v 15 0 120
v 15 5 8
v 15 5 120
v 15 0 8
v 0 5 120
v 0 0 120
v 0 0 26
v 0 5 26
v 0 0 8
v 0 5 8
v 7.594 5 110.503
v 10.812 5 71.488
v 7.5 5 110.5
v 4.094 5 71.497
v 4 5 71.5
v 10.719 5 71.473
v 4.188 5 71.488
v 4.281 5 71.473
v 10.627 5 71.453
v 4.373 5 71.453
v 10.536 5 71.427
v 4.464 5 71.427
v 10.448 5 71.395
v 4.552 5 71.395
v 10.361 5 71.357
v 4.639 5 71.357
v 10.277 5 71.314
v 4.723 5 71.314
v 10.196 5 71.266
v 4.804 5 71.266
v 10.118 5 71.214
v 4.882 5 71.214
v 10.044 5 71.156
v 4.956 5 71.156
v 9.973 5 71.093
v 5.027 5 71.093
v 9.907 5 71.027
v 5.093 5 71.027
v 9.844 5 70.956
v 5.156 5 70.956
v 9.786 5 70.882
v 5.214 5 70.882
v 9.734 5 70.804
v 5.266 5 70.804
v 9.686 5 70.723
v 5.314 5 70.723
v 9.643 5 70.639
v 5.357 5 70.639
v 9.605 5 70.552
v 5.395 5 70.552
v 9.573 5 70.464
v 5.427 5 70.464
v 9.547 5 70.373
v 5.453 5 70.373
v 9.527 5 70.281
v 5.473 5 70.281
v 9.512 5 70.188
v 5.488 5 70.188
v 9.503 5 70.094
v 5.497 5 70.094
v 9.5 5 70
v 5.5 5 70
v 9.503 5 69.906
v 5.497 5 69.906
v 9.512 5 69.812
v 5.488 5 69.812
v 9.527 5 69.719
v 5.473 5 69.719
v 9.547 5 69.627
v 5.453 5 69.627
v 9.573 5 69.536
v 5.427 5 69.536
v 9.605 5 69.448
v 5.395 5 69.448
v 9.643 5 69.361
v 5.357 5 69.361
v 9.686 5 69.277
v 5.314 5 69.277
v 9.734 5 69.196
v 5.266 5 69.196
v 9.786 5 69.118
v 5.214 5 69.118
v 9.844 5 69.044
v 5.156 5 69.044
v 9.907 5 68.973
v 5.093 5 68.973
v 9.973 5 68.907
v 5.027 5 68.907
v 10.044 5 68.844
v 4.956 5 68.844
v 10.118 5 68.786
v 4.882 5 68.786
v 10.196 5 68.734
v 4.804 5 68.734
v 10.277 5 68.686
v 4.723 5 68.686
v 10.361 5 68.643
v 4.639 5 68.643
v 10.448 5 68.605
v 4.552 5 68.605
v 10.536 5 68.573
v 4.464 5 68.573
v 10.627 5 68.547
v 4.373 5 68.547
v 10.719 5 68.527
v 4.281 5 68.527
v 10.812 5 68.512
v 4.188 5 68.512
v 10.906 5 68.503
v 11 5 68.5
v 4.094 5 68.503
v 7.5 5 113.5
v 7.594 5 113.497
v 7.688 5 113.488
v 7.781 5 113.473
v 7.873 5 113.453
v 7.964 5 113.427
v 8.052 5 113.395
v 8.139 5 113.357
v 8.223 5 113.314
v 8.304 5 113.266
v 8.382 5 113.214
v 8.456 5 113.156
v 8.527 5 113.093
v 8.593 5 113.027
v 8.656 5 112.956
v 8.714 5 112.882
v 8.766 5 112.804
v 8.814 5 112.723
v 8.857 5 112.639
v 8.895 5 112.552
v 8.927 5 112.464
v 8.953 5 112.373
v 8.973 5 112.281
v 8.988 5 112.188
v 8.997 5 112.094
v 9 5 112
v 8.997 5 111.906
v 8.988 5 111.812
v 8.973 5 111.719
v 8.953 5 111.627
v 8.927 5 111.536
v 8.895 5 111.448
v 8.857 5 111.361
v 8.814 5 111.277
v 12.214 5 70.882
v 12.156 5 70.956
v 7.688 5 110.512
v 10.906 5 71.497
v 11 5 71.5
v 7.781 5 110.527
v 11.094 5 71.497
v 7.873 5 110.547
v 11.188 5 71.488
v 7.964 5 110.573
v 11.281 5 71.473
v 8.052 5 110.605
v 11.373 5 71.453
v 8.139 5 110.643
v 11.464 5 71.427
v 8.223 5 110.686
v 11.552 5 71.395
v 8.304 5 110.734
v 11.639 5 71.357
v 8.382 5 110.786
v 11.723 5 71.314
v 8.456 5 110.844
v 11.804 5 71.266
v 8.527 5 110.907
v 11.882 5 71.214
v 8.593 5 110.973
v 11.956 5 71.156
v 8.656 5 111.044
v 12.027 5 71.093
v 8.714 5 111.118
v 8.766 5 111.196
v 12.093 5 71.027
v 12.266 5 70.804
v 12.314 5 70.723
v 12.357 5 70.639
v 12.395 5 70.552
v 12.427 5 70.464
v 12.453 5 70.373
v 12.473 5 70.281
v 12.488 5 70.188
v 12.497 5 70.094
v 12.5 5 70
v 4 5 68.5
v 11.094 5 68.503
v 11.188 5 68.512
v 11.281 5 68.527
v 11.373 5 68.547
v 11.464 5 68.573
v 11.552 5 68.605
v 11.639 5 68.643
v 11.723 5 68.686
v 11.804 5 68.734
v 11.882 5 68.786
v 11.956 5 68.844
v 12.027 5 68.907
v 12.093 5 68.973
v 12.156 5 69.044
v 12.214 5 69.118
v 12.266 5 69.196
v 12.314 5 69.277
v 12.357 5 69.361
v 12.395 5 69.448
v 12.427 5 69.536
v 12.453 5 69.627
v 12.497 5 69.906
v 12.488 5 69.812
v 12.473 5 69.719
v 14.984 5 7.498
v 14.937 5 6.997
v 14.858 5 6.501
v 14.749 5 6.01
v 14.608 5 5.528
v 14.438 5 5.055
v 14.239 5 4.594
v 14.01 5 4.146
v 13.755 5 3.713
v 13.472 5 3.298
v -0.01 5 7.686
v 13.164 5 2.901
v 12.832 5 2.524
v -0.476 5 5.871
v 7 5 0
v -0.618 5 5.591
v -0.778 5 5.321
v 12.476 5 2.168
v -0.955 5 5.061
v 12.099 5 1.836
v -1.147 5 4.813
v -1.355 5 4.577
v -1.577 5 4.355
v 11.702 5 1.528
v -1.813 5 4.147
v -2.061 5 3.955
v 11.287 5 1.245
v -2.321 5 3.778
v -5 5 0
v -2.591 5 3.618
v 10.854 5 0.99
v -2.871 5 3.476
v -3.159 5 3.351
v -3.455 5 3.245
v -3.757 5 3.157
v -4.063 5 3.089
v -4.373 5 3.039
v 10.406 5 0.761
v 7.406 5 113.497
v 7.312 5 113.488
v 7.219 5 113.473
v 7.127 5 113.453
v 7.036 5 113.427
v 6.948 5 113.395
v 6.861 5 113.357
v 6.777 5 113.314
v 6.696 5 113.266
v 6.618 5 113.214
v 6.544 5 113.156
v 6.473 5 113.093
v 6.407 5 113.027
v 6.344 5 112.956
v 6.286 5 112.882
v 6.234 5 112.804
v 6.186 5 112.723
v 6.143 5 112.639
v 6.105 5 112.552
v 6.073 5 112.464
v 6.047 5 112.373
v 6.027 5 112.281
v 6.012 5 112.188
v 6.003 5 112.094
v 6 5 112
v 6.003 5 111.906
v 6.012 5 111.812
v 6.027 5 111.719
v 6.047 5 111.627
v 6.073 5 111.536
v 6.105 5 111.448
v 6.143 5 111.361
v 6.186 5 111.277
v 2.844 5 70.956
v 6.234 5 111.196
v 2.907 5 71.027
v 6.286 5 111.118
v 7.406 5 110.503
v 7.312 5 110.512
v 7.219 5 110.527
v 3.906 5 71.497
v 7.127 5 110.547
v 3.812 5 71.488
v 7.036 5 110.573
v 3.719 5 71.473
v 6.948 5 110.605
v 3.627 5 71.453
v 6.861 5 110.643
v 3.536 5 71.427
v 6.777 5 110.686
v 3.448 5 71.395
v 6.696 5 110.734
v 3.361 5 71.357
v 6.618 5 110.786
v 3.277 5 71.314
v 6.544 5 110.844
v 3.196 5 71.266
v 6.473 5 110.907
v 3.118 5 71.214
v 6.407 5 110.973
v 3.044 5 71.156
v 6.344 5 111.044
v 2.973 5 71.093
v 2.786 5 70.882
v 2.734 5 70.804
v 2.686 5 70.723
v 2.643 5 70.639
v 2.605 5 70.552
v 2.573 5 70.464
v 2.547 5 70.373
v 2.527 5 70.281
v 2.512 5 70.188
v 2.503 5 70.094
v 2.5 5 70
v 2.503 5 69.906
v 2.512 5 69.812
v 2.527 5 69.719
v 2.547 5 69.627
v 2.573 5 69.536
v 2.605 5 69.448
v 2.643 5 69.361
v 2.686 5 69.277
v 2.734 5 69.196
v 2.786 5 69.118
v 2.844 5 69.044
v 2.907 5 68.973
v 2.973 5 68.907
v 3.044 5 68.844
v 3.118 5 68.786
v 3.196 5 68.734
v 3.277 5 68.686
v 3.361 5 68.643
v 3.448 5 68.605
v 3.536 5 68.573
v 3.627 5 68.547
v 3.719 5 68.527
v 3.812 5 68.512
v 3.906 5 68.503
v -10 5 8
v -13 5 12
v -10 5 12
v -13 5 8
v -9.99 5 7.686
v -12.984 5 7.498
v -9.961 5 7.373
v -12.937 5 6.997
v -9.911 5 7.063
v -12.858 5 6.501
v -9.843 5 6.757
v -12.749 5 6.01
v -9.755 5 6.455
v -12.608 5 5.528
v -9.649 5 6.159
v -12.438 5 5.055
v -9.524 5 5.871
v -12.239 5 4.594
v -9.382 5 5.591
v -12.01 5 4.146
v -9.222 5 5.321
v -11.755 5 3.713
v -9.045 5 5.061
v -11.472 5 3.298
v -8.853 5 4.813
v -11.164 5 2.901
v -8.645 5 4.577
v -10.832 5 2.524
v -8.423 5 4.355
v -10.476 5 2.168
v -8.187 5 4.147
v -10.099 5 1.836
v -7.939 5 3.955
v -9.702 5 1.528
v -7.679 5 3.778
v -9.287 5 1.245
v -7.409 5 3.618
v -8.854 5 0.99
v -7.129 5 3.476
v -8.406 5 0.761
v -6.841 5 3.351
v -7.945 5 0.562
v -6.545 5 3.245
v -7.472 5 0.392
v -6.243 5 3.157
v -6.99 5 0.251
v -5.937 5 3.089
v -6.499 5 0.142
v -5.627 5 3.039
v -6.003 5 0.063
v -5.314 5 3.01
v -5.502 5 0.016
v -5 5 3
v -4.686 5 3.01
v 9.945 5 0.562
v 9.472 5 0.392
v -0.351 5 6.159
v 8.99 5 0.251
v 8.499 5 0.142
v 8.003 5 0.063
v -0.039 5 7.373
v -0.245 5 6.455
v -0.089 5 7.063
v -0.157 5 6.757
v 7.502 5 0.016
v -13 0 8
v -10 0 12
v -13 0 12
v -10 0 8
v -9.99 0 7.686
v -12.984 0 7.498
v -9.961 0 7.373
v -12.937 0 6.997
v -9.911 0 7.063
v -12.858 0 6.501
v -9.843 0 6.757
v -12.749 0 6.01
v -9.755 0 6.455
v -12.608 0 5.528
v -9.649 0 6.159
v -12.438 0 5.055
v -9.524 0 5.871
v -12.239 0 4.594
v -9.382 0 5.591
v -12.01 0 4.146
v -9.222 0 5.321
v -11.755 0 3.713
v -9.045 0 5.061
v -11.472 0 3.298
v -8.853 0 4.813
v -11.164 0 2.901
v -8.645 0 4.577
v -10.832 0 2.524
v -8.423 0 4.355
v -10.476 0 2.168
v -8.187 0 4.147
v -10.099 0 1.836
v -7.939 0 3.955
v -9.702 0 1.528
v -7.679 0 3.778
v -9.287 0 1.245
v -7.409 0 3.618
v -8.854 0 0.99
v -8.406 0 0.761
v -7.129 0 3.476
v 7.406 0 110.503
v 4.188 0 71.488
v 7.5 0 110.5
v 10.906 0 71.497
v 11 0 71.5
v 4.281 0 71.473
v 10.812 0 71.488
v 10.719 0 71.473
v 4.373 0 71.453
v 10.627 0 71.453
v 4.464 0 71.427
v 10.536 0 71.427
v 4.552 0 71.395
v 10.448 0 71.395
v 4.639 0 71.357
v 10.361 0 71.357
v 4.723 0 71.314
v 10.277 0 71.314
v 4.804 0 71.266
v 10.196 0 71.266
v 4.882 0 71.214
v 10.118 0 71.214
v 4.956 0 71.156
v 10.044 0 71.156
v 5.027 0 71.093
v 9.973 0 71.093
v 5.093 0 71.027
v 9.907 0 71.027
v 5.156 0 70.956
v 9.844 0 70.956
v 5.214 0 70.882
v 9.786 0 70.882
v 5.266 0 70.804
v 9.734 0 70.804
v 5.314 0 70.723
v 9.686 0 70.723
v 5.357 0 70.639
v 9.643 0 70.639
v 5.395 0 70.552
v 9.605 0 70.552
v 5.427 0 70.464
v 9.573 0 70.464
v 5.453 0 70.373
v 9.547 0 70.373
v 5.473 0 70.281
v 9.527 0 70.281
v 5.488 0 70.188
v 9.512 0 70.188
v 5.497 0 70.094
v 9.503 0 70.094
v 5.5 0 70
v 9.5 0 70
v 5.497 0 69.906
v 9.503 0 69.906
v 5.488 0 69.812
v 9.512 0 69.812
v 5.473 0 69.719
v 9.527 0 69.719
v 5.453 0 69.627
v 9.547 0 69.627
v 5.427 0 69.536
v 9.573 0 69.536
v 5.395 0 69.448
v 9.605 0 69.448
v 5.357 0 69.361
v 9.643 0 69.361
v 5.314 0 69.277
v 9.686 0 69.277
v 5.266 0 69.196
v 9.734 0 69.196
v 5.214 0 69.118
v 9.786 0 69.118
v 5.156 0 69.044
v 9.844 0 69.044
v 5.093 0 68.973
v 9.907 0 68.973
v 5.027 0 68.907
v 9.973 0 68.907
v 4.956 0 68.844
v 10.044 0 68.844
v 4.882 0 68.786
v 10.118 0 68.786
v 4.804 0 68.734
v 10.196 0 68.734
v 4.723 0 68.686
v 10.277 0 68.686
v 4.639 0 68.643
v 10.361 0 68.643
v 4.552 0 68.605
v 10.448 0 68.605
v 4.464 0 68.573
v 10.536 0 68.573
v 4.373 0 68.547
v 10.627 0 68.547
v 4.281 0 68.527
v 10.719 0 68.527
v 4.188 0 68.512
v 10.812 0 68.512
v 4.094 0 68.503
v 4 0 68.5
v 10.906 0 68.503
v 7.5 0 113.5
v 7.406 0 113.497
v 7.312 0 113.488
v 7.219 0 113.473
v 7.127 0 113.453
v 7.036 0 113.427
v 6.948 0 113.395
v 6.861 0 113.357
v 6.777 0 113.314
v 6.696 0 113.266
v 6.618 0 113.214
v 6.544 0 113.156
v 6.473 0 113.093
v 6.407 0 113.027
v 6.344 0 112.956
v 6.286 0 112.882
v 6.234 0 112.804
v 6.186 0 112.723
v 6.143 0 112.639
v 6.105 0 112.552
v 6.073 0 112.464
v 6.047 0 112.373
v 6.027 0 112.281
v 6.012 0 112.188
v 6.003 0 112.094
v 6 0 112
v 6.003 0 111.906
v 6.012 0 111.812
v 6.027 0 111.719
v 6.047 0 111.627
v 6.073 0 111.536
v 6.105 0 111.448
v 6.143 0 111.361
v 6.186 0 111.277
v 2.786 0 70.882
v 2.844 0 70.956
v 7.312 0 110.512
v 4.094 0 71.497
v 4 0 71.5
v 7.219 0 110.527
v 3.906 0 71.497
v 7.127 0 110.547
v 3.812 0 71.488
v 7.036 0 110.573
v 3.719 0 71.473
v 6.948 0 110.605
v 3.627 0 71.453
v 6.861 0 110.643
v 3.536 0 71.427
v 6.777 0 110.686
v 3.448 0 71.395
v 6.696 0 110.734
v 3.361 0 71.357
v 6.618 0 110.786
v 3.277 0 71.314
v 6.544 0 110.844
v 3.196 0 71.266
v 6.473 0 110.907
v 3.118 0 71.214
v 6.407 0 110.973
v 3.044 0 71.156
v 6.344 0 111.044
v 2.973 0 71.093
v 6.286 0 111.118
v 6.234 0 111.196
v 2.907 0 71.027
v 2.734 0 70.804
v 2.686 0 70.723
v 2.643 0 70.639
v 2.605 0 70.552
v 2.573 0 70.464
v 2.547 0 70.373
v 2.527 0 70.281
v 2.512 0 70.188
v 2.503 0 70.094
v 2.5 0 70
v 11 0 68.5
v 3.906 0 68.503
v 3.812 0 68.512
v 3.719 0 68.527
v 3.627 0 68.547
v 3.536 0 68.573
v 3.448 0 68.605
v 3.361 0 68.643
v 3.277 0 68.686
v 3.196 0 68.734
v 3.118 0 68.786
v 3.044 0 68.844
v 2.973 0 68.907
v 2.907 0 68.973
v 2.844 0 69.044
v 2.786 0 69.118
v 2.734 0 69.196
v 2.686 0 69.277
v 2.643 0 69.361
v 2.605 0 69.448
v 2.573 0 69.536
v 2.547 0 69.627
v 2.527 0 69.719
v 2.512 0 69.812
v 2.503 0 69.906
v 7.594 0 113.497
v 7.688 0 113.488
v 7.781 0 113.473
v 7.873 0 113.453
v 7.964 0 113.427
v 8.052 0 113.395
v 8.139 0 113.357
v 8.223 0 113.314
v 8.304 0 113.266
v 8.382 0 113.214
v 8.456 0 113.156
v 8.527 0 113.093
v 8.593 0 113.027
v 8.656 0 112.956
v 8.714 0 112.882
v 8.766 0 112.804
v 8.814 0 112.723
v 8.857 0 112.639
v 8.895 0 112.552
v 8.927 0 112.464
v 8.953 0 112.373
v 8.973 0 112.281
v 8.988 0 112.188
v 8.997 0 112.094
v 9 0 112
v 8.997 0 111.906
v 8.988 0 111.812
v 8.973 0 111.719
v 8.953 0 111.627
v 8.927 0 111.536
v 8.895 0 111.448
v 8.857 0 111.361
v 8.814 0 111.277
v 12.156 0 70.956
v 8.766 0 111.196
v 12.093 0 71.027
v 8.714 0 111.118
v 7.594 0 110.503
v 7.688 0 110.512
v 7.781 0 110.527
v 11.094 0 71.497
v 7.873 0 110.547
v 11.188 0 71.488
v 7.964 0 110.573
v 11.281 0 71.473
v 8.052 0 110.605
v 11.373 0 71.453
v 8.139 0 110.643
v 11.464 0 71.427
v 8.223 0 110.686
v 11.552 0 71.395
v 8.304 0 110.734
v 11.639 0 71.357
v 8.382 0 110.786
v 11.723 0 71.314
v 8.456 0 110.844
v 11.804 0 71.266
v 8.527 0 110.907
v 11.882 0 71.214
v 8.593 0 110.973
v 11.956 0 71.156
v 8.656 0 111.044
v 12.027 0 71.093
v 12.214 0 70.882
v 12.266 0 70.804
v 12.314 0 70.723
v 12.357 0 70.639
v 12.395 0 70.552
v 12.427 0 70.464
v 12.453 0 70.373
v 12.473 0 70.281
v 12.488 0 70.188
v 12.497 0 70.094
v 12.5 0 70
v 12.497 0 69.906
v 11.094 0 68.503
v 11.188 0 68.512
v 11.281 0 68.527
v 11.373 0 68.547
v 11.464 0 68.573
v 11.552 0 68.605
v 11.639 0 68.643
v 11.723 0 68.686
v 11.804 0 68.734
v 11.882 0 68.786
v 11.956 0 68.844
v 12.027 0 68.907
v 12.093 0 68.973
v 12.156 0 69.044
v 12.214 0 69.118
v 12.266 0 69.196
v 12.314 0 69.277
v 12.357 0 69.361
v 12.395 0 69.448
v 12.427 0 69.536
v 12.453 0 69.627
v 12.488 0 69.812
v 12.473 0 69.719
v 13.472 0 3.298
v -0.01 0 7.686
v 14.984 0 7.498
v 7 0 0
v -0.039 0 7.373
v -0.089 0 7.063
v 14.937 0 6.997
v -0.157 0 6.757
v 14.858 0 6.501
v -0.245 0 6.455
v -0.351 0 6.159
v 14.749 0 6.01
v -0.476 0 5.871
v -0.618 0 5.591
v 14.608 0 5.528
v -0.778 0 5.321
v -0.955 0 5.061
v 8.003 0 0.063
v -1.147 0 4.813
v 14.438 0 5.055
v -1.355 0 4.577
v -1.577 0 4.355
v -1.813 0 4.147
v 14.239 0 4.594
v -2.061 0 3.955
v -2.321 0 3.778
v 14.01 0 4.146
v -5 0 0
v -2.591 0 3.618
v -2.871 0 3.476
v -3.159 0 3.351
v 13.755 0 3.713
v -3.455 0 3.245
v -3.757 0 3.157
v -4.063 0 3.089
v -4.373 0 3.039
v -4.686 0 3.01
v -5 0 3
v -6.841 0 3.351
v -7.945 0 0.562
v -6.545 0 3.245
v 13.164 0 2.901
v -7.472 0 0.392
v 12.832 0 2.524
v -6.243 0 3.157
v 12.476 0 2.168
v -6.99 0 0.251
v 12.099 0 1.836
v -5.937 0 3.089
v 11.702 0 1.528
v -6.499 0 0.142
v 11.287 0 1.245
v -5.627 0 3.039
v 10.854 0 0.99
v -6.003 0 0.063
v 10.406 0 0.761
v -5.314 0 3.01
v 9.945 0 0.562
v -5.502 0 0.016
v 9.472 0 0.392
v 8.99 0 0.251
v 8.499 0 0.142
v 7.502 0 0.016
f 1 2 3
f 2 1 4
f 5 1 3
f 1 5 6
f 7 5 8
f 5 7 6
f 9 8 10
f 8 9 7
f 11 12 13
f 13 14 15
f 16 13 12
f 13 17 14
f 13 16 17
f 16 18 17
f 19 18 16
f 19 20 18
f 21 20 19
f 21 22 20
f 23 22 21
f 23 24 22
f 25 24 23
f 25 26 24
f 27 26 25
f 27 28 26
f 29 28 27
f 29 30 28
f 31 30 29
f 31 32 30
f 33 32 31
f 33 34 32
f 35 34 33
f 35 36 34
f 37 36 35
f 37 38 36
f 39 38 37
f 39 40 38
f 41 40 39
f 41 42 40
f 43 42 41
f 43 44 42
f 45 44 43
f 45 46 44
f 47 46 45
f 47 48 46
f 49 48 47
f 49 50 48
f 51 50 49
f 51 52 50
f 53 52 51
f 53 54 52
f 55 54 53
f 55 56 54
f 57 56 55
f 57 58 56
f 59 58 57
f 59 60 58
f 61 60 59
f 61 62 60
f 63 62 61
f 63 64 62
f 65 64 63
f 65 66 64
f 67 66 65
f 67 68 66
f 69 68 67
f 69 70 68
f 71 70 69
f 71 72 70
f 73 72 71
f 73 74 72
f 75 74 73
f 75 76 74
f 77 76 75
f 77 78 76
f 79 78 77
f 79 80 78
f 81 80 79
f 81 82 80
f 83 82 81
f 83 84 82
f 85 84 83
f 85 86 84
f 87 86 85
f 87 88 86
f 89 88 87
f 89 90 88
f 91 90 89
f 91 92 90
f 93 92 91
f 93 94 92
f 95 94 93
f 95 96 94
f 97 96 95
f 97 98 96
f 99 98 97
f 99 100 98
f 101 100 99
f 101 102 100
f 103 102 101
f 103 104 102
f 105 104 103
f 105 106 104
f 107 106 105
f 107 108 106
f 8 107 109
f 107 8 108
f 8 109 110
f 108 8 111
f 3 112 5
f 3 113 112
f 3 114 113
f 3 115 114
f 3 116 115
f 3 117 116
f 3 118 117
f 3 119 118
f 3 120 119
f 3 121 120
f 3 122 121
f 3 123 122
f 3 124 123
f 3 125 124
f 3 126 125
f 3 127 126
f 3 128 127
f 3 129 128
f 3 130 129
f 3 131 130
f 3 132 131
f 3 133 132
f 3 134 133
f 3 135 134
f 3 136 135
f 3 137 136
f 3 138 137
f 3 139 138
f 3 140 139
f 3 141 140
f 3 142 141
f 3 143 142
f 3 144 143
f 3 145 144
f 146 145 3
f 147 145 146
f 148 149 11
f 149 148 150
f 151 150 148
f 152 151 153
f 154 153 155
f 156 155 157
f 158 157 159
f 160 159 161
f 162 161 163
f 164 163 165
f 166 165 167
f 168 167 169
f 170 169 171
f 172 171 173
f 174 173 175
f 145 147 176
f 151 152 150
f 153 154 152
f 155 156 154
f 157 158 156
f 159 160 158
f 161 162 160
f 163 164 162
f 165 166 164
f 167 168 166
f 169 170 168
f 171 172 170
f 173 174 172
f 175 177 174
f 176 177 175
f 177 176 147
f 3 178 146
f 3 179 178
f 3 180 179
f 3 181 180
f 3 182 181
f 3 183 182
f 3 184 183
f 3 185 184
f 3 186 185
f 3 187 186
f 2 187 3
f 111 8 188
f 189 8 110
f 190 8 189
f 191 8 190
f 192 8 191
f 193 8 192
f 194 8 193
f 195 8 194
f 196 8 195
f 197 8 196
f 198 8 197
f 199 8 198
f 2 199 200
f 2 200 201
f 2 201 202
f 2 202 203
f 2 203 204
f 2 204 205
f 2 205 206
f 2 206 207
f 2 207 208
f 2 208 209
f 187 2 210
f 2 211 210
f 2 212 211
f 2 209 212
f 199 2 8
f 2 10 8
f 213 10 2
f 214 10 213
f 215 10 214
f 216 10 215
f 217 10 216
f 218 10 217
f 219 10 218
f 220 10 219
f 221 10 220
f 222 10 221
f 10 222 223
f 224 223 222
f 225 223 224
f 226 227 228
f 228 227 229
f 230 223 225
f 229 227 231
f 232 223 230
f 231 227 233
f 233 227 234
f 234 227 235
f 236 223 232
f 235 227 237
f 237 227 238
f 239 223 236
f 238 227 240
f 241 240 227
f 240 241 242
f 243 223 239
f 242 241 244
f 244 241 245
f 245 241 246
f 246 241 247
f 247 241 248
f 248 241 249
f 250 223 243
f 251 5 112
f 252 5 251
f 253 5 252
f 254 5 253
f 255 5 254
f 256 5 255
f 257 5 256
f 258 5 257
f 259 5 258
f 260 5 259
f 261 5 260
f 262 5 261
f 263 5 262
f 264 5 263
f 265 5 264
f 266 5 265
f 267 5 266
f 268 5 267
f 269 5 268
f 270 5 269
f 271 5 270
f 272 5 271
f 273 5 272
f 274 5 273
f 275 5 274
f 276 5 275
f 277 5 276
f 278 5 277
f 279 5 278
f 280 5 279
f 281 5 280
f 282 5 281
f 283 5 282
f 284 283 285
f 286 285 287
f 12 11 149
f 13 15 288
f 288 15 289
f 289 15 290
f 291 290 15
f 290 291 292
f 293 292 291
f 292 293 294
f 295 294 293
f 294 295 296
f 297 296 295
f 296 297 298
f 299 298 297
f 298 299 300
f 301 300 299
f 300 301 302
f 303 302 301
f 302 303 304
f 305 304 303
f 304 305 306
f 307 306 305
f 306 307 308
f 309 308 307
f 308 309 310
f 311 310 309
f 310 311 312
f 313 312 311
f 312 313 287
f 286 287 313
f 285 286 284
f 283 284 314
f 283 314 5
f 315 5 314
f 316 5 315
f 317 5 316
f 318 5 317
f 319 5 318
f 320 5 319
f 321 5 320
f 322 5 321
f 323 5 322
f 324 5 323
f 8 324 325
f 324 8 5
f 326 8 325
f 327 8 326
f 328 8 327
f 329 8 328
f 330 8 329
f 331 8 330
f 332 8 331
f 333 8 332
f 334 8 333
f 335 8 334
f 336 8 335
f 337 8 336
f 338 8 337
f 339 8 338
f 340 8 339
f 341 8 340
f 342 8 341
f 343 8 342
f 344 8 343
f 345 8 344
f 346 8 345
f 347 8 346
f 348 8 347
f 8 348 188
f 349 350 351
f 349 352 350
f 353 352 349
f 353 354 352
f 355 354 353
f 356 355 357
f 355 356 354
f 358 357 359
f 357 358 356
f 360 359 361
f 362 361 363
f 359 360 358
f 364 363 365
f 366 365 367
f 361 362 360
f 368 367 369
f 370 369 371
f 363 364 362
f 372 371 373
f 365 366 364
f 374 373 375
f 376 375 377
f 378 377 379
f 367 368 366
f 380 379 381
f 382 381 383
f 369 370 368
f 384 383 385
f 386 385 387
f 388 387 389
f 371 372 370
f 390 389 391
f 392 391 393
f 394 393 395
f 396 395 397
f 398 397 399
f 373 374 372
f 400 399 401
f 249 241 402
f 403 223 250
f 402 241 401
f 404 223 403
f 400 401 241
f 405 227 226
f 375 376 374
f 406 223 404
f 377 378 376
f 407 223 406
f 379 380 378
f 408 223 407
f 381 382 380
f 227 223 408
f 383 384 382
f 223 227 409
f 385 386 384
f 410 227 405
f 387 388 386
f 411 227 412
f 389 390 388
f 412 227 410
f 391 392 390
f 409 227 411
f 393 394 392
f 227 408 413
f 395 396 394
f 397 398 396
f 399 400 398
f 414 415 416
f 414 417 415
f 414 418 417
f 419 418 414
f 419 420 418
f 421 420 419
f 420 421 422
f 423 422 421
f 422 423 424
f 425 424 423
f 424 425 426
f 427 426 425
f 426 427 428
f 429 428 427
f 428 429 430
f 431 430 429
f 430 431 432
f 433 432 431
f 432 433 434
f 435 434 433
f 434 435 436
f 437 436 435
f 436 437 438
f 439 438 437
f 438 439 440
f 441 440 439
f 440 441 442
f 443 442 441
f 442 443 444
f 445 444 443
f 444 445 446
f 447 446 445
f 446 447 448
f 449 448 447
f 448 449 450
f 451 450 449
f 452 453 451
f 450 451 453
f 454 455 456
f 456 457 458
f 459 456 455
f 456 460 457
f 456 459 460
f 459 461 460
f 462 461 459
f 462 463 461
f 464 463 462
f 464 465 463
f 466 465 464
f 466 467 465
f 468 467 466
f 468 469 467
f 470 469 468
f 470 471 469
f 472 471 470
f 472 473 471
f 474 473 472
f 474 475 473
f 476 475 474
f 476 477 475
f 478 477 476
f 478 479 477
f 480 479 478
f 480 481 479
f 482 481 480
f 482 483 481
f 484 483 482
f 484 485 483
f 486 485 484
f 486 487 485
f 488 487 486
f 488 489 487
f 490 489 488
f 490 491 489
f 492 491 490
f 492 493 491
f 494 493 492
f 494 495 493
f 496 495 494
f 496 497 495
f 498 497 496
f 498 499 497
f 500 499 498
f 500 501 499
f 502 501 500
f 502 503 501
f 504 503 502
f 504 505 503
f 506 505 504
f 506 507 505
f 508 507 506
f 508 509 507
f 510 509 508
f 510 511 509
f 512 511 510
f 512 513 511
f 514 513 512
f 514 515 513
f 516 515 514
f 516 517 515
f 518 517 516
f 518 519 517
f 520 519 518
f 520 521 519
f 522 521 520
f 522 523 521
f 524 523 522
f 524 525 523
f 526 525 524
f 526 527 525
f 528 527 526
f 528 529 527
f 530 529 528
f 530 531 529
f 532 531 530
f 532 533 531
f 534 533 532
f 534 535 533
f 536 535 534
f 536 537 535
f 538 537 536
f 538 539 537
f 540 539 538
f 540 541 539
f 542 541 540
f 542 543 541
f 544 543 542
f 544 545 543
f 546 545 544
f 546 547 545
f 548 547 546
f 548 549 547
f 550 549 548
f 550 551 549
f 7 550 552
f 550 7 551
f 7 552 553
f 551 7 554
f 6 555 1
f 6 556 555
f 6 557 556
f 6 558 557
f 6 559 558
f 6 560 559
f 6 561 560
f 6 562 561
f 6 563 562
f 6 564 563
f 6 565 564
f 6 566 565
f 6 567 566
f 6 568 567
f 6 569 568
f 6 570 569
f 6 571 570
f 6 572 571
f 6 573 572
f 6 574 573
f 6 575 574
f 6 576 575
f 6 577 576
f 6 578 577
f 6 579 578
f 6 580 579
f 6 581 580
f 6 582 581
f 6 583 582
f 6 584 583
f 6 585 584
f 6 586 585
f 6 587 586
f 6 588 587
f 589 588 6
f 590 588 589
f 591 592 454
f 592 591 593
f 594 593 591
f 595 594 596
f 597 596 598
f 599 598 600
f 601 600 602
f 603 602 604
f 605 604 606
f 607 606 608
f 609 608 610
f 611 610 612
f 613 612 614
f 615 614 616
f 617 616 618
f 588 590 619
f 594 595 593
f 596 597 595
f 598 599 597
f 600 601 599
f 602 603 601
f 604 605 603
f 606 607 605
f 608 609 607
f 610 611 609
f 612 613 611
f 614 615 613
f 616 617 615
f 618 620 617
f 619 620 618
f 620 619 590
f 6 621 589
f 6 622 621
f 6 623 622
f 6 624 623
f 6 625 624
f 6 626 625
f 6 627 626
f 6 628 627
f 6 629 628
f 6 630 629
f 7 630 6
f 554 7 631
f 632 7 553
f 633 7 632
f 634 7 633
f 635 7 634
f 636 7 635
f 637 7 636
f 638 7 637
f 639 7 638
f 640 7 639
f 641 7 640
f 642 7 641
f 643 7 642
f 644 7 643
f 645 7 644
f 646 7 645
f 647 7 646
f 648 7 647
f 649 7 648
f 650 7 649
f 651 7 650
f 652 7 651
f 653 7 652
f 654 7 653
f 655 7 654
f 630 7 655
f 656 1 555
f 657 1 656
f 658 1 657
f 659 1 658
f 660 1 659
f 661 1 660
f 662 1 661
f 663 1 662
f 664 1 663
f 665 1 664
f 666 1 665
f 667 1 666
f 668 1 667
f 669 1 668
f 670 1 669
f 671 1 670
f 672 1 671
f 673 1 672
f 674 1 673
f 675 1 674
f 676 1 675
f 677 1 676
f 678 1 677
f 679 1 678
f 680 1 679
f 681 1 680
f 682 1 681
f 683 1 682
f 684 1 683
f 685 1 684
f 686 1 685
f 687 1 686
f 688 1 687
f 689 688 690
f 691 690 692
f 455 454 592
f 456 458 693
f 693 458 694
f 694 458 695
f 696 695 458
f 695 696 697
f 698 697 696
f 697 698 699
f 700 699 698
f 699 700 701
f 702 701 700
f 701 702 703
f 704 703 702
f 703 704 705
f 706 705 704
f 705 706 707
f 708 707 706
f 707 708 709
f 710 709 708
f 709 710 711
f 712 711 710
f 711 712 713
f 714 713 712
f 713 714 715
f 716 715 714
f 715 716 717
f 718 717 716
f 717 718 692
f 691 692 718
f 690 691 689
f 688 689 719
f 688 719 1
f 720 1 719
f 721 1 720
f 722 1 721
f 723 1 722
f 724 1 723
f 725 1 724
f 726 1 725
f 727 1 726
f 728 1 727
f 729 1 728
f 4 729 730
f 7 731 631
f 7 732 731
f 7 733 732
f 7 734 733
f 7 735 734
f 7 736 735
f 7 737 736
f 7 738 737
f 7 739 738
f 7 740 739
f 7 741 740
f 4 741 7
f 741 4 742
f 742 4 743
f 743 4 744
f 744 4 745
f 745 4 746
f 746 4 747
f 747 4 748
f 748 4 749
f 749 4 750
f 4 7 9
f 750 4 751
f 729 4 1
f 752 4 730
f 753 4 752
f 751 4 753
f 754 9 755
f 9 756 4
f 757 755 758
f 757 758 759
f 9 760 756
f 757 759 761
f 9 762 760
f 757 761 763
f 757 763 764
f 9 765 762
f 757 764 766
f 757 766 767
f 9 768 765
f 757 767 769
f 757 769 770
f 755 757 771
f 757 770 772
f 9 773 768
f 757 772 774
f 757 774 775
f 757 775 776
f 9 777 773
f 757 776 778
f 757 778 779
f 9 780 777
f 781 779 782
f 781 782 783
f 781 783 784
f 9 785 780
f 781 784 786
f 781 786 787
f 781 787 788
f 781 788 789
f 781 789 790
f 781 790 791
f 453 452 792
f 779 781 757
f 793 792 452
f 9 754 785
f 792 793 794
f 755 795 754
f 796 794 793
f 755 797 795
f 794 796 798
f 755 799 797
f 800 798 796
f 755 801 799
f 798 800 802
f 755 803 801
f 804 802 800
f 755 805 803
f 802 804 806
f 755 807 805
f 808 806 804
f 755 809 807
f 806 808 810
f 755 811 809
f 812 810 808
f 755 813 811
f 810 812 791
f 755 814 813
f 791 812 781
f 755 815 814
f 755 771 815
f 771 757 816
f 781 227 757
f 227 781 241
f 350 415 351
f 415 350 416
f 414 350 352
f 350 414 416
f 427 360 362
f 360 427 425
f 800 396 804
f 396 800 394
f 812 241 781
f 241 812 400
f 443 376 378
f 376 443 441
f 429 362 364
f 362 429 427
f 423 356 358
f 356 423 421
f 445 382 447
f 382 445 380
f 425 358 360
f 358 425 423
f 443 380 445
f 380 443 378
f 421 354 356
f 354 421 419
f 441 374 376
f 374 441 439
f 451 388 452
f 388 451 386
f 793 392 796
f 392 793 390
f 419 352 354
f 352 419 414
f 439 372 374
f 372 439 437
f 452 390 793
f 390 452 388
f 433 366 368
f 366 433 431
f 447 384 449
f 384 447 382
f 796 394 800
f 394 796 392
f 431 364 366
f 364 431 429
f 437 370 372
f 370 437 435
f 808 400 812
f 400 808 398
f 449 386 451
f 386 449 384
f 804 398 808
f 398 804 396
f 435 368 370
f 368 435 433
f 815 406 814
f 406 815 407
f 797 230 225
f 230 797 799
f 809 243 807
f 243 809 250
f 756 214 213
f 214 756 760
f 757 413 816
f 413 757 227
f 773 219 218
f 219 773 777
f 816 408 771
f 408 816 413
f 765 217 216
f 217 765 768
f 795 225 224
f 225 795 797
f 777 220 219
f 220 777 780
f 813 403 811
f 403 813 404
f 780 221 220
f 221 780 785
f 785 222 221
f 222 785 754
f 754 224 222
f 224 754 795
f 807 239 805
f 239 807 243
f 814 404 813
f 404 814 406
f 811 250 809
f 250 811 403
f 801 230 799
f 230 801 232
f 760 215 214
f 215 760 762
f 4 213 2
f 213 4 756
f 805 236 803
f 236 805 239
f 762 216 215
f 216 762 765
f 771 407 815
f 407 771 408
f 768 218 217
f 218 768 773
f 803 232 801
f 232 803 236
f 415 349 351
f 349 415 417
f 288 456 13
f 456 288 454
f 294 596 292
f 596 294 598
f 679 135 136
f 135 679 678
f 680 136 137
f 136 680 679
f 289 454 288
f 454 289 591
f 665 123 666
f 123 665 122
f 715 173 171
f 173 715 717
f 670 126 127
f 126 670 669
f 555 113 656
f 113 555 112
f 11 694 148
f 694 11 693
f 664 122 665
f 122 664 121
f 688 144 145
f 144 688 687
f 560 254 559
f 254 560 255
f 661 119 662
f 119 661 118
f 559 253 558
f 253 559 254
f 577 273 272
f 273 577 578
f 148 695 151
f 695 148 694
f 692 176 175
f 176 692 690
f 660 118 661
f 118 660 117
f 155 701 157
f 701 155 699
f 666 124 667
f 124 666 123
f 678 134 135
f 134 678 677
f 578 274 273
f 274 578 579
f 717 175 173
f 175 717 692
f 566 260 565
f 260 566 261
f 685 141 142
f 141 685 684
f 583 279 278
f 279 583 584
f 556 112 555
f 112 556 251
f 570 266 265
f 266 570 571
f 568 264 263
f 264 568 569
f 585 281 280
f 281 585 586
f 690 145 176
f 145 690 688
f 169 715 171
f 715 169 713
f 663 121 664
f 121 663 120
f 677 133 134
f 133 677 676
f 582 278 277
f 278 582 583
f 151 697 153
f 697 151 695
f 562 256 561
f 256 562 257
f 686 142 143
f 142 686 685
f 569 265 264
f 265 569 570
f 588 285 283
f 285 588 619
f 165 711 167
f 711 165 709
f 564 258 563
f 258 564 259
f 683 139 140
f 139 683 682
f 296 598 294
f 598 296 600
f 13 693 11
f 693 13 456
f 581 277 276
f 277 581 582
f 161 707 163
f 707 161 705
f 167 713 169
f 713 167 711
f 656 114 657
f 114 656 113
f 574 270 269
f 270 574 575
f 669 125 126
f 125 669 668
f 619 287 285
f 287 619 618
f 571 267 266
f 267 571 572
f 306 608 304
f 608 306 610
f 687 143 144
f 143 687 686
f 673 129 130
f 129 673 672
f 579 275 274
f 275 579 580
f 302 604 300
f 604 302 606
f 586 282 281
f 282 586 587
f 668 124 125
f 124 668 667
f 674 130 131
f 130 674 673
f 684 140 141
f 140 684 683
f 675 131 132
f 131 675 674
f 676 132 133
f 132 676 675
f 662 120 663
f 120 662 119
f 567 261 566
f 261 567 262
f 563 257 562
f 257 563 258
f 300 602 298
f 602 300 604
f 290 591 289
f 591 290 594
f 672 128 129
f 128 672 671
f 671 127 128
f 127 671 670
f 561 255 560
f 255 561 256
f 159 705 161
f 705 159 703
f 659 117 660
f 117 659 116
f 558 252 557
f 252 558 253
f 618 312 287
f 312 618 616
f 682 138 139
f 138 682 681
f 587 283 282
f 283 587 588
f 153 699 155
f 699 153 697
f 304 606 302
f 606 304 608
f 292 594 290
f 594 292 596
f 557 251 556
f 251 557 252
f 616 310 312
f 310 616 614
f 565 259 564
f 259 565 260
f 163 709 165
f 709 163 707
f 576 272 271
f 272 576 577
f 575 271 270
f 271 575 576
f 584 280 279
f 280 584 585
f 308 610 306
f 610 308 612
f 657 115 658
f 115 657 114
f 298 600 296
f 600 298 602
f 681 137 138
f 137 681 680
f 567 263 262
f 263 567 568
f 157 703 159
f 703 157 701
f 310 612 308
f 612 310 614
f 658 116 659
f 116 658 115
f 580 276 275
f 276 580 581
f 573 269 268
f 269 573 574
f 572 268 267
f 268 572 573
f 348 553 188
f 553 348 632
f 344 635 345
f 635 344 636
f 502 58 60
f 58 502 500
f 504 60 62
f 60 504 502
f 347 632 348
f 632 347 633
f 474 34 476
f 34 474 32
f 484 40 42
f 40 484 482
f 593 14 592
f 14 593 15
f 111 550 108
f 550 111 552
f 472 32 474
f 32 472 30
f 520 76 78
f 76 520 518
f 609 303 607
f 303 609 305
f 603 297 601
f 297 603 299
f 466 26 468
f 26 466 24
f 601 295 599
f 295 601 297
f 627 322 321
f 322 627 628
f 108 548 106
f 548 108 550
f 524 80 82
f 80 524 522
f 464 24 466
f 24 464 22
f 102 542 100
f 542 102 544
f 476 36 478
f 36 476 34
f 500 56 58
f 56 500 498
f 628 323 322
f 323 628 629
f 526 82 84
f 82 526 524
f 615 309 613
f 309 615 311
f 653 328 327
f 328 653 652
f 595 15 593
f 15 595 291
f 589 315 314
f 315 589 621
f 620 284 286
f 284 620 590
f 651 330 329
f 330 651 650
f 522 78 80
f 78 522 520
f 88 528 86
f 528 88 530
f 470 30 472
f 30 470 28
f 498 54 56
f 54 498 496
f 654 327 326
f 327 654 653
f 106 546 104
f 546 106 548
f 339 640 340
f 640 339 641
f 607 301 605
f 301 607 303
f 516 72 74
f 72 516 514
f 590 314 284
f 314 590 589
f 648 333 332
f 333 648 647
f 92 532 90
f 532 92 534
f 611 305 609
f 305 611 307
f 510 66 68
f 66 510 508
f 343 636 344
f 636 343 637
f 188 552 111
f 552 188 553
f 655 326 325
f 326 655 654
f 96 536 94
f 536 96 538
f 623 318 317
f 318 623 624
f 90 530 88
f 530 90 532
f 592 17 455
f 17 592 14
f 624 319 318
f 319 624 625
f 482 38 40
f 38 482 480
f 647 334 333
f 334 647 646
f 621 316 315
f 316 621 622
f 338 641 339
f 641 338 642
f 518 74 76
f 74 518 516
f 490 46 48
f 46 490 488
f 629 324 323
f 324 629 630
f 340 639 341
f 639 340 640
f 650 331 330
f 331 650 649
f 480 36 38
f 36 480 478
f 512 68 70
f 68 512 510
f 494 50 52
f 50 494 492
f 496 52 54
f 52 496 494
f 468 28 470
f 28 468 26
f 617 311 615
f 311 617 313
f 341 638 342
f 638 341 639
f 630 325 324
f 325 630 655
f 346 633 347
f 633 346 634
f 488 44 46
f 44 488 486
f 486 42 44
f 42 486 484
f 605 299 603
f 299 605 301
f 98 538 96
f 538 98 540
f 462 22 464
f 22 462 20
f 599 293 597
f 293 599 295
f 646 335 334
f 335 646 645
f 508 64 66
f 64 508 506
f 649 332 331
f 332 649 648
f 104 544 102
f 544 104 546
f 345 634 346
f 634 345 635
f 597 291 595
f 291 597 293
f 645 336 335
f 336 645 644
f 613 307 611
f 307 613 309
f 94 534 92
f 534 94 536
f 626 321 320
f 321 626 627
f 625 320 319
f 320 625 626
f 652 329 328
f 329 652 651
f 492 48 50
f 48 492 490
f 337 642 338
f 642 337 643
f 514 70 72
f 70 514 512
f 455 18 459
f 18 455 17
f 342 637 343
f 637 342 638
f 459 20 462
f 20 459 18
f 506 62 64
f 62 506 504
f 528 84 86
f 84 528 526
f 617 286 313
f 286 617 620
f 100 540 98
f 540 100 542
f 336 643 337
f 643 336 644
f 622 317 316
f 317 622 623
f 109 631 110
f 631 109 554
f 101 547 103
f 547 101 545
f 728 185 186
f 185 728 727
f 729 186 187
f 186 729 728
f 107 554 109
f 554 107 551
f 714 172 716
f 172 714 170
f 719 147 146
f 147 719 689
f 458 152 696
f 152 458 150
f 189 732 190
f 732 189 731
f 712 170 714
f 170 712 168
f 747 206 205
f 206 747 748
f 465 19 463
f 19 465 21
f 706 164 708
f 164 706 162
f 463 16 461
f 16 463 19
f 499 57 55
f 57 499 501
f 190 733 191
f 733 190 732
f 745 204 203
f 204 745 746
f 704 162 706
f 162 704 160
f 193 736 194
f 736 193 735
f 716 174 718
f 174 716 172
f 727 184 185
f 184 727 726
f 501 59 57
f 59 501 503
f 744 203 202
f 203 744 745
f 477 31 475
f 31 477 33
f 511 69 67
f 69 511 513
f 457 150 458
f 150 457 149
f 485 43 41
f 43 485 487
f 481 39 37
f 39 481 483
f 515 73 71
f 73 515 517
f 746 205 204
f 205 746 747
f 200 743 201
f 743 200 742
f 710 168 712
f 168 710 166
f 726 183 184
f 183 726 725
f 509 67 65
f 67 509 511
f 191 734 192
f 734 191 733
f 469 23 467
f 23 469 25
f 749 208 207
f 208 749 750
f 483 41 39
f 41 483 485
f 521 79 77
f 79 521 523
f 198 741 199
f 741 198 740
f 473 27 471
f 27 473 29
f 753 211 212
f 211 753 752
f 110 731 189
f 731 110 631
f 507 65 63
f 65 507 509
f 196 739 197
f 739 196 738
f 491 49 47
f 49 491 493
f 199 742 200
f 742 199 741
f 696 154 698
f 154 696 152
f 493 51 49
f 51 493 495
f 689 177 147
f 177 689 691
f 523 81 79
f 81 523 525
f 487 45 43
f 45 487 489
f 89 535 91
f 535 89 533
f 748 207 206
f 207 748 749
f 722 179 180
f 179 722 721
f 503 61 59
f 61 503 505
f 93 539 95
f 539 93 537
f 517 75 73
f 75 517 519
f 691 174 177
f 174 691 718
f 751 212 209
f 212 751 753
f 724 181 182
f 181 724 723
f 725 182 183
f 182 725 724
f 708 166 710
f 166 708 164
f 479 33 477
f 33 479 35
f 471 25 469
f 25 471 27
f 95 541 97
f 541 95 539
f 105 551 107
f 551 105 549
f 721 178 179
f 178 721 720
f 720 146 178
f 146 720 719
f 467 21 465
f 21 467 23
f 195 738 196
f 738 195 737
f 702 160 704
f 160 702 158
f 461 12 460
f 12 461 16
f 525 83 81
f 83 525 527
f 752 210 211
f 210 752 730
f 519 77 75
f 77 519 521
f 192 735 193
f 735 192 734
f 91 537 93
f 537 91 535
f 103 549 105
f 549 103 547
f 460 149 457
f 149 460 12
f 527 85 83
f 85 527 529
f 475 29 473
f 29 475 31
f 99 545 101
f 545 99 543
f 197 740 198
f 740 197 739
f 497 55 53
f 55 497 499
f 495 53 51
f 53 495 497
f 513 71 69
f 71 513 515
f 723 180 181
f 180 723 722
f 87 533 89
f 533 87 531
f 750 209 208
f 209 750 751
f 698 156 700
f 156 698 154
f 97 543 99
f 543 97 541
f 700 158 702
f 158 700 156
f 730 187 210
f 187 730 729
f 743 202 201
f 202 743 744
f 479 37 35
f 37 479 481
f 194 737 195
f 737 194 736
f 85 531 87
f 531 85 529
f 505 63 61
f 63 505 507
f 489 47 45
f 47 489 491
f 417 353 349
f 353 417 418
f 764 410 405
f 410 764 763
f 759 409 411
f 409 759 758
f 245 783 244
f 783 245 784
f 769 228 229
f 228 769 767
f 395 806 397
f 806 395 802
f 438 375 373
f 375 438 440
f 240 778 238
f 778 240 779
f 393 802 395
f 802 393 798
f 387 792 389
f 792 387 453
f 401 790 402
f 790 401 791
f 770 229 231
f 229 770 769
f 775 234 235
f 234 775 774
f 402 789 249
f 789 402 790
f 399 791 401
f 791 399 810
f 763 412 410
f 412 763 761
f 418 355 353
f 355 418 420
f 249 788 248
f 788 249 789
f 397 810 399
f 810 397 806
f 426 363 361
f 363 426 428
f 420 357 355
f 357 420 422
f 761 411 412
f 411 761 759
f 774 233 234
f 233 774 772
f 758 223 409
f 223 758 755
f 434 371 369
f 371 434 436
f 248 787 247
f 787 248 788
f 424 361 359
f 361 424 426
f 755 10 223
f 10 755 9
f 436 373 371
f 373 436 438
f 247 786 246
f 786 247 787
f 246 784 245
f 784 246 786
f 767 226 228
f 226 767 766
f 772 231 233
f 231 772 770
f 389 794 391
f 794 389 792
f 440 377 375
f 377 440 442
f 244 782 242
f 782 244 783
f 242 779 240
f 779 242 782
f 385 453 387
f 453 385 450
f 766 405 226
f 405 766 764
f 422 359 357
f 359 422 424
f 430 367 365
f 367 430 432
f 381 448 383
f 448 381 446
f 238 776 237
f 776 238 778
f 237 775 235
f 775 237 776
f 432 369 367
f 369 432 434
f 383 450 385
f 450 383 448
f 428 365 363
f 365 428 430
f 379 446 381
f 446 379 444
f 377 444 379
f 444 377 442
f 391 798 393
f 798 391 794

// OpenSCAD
difference(){
	union(){ 

        translate([0,0,8]){
           cube([15,5,120-8], center=false);
        }        
        translate([-13+8,0,0]){
           cube([20-8,5,8], center=false);
        }        
        translate([-13,0,8]){
           cube([3,5,4], center=false);
        }        
        translate([-5,5,8]){
            rotate([90,0,0]){
                cylinder(h=5, r=8, $fn=100, center=false);
            }
        }
        translate([7,5,8]){
            rotate([90,0,0]){
                cylinder(h=5, r=8, $fn=100, center=false);
            }
        }

	}
	union() {
        translate([-10,-1,8]){
           cube([10,7,14], center=false);
        }        
        translate([-20,-1,12]){
           cube([20,7,14], center=false);
        }        
        translate([7.5,7,120-8]){
            rotate([90,0,0]){
                cylinder(h=20, r=1.5, $fn=100, center=false);
            }
        }
        translate([4,7,70]){
            rotate([90,0,0]){
                cylinder(h=20, r=1.5, $fn=100, center=false);
            }
        }
        translate([11,7,70]){
            rotate([90,0,0]){
                cylinder(h=20, r=1.5, $fn=100, center=false);
            }
        }
        translate([-5,8,8]){
            rotate([90,0,0]){
                cylinder(h=20, r=5, $fn=100, center=false);
            }
        }

	}
}
